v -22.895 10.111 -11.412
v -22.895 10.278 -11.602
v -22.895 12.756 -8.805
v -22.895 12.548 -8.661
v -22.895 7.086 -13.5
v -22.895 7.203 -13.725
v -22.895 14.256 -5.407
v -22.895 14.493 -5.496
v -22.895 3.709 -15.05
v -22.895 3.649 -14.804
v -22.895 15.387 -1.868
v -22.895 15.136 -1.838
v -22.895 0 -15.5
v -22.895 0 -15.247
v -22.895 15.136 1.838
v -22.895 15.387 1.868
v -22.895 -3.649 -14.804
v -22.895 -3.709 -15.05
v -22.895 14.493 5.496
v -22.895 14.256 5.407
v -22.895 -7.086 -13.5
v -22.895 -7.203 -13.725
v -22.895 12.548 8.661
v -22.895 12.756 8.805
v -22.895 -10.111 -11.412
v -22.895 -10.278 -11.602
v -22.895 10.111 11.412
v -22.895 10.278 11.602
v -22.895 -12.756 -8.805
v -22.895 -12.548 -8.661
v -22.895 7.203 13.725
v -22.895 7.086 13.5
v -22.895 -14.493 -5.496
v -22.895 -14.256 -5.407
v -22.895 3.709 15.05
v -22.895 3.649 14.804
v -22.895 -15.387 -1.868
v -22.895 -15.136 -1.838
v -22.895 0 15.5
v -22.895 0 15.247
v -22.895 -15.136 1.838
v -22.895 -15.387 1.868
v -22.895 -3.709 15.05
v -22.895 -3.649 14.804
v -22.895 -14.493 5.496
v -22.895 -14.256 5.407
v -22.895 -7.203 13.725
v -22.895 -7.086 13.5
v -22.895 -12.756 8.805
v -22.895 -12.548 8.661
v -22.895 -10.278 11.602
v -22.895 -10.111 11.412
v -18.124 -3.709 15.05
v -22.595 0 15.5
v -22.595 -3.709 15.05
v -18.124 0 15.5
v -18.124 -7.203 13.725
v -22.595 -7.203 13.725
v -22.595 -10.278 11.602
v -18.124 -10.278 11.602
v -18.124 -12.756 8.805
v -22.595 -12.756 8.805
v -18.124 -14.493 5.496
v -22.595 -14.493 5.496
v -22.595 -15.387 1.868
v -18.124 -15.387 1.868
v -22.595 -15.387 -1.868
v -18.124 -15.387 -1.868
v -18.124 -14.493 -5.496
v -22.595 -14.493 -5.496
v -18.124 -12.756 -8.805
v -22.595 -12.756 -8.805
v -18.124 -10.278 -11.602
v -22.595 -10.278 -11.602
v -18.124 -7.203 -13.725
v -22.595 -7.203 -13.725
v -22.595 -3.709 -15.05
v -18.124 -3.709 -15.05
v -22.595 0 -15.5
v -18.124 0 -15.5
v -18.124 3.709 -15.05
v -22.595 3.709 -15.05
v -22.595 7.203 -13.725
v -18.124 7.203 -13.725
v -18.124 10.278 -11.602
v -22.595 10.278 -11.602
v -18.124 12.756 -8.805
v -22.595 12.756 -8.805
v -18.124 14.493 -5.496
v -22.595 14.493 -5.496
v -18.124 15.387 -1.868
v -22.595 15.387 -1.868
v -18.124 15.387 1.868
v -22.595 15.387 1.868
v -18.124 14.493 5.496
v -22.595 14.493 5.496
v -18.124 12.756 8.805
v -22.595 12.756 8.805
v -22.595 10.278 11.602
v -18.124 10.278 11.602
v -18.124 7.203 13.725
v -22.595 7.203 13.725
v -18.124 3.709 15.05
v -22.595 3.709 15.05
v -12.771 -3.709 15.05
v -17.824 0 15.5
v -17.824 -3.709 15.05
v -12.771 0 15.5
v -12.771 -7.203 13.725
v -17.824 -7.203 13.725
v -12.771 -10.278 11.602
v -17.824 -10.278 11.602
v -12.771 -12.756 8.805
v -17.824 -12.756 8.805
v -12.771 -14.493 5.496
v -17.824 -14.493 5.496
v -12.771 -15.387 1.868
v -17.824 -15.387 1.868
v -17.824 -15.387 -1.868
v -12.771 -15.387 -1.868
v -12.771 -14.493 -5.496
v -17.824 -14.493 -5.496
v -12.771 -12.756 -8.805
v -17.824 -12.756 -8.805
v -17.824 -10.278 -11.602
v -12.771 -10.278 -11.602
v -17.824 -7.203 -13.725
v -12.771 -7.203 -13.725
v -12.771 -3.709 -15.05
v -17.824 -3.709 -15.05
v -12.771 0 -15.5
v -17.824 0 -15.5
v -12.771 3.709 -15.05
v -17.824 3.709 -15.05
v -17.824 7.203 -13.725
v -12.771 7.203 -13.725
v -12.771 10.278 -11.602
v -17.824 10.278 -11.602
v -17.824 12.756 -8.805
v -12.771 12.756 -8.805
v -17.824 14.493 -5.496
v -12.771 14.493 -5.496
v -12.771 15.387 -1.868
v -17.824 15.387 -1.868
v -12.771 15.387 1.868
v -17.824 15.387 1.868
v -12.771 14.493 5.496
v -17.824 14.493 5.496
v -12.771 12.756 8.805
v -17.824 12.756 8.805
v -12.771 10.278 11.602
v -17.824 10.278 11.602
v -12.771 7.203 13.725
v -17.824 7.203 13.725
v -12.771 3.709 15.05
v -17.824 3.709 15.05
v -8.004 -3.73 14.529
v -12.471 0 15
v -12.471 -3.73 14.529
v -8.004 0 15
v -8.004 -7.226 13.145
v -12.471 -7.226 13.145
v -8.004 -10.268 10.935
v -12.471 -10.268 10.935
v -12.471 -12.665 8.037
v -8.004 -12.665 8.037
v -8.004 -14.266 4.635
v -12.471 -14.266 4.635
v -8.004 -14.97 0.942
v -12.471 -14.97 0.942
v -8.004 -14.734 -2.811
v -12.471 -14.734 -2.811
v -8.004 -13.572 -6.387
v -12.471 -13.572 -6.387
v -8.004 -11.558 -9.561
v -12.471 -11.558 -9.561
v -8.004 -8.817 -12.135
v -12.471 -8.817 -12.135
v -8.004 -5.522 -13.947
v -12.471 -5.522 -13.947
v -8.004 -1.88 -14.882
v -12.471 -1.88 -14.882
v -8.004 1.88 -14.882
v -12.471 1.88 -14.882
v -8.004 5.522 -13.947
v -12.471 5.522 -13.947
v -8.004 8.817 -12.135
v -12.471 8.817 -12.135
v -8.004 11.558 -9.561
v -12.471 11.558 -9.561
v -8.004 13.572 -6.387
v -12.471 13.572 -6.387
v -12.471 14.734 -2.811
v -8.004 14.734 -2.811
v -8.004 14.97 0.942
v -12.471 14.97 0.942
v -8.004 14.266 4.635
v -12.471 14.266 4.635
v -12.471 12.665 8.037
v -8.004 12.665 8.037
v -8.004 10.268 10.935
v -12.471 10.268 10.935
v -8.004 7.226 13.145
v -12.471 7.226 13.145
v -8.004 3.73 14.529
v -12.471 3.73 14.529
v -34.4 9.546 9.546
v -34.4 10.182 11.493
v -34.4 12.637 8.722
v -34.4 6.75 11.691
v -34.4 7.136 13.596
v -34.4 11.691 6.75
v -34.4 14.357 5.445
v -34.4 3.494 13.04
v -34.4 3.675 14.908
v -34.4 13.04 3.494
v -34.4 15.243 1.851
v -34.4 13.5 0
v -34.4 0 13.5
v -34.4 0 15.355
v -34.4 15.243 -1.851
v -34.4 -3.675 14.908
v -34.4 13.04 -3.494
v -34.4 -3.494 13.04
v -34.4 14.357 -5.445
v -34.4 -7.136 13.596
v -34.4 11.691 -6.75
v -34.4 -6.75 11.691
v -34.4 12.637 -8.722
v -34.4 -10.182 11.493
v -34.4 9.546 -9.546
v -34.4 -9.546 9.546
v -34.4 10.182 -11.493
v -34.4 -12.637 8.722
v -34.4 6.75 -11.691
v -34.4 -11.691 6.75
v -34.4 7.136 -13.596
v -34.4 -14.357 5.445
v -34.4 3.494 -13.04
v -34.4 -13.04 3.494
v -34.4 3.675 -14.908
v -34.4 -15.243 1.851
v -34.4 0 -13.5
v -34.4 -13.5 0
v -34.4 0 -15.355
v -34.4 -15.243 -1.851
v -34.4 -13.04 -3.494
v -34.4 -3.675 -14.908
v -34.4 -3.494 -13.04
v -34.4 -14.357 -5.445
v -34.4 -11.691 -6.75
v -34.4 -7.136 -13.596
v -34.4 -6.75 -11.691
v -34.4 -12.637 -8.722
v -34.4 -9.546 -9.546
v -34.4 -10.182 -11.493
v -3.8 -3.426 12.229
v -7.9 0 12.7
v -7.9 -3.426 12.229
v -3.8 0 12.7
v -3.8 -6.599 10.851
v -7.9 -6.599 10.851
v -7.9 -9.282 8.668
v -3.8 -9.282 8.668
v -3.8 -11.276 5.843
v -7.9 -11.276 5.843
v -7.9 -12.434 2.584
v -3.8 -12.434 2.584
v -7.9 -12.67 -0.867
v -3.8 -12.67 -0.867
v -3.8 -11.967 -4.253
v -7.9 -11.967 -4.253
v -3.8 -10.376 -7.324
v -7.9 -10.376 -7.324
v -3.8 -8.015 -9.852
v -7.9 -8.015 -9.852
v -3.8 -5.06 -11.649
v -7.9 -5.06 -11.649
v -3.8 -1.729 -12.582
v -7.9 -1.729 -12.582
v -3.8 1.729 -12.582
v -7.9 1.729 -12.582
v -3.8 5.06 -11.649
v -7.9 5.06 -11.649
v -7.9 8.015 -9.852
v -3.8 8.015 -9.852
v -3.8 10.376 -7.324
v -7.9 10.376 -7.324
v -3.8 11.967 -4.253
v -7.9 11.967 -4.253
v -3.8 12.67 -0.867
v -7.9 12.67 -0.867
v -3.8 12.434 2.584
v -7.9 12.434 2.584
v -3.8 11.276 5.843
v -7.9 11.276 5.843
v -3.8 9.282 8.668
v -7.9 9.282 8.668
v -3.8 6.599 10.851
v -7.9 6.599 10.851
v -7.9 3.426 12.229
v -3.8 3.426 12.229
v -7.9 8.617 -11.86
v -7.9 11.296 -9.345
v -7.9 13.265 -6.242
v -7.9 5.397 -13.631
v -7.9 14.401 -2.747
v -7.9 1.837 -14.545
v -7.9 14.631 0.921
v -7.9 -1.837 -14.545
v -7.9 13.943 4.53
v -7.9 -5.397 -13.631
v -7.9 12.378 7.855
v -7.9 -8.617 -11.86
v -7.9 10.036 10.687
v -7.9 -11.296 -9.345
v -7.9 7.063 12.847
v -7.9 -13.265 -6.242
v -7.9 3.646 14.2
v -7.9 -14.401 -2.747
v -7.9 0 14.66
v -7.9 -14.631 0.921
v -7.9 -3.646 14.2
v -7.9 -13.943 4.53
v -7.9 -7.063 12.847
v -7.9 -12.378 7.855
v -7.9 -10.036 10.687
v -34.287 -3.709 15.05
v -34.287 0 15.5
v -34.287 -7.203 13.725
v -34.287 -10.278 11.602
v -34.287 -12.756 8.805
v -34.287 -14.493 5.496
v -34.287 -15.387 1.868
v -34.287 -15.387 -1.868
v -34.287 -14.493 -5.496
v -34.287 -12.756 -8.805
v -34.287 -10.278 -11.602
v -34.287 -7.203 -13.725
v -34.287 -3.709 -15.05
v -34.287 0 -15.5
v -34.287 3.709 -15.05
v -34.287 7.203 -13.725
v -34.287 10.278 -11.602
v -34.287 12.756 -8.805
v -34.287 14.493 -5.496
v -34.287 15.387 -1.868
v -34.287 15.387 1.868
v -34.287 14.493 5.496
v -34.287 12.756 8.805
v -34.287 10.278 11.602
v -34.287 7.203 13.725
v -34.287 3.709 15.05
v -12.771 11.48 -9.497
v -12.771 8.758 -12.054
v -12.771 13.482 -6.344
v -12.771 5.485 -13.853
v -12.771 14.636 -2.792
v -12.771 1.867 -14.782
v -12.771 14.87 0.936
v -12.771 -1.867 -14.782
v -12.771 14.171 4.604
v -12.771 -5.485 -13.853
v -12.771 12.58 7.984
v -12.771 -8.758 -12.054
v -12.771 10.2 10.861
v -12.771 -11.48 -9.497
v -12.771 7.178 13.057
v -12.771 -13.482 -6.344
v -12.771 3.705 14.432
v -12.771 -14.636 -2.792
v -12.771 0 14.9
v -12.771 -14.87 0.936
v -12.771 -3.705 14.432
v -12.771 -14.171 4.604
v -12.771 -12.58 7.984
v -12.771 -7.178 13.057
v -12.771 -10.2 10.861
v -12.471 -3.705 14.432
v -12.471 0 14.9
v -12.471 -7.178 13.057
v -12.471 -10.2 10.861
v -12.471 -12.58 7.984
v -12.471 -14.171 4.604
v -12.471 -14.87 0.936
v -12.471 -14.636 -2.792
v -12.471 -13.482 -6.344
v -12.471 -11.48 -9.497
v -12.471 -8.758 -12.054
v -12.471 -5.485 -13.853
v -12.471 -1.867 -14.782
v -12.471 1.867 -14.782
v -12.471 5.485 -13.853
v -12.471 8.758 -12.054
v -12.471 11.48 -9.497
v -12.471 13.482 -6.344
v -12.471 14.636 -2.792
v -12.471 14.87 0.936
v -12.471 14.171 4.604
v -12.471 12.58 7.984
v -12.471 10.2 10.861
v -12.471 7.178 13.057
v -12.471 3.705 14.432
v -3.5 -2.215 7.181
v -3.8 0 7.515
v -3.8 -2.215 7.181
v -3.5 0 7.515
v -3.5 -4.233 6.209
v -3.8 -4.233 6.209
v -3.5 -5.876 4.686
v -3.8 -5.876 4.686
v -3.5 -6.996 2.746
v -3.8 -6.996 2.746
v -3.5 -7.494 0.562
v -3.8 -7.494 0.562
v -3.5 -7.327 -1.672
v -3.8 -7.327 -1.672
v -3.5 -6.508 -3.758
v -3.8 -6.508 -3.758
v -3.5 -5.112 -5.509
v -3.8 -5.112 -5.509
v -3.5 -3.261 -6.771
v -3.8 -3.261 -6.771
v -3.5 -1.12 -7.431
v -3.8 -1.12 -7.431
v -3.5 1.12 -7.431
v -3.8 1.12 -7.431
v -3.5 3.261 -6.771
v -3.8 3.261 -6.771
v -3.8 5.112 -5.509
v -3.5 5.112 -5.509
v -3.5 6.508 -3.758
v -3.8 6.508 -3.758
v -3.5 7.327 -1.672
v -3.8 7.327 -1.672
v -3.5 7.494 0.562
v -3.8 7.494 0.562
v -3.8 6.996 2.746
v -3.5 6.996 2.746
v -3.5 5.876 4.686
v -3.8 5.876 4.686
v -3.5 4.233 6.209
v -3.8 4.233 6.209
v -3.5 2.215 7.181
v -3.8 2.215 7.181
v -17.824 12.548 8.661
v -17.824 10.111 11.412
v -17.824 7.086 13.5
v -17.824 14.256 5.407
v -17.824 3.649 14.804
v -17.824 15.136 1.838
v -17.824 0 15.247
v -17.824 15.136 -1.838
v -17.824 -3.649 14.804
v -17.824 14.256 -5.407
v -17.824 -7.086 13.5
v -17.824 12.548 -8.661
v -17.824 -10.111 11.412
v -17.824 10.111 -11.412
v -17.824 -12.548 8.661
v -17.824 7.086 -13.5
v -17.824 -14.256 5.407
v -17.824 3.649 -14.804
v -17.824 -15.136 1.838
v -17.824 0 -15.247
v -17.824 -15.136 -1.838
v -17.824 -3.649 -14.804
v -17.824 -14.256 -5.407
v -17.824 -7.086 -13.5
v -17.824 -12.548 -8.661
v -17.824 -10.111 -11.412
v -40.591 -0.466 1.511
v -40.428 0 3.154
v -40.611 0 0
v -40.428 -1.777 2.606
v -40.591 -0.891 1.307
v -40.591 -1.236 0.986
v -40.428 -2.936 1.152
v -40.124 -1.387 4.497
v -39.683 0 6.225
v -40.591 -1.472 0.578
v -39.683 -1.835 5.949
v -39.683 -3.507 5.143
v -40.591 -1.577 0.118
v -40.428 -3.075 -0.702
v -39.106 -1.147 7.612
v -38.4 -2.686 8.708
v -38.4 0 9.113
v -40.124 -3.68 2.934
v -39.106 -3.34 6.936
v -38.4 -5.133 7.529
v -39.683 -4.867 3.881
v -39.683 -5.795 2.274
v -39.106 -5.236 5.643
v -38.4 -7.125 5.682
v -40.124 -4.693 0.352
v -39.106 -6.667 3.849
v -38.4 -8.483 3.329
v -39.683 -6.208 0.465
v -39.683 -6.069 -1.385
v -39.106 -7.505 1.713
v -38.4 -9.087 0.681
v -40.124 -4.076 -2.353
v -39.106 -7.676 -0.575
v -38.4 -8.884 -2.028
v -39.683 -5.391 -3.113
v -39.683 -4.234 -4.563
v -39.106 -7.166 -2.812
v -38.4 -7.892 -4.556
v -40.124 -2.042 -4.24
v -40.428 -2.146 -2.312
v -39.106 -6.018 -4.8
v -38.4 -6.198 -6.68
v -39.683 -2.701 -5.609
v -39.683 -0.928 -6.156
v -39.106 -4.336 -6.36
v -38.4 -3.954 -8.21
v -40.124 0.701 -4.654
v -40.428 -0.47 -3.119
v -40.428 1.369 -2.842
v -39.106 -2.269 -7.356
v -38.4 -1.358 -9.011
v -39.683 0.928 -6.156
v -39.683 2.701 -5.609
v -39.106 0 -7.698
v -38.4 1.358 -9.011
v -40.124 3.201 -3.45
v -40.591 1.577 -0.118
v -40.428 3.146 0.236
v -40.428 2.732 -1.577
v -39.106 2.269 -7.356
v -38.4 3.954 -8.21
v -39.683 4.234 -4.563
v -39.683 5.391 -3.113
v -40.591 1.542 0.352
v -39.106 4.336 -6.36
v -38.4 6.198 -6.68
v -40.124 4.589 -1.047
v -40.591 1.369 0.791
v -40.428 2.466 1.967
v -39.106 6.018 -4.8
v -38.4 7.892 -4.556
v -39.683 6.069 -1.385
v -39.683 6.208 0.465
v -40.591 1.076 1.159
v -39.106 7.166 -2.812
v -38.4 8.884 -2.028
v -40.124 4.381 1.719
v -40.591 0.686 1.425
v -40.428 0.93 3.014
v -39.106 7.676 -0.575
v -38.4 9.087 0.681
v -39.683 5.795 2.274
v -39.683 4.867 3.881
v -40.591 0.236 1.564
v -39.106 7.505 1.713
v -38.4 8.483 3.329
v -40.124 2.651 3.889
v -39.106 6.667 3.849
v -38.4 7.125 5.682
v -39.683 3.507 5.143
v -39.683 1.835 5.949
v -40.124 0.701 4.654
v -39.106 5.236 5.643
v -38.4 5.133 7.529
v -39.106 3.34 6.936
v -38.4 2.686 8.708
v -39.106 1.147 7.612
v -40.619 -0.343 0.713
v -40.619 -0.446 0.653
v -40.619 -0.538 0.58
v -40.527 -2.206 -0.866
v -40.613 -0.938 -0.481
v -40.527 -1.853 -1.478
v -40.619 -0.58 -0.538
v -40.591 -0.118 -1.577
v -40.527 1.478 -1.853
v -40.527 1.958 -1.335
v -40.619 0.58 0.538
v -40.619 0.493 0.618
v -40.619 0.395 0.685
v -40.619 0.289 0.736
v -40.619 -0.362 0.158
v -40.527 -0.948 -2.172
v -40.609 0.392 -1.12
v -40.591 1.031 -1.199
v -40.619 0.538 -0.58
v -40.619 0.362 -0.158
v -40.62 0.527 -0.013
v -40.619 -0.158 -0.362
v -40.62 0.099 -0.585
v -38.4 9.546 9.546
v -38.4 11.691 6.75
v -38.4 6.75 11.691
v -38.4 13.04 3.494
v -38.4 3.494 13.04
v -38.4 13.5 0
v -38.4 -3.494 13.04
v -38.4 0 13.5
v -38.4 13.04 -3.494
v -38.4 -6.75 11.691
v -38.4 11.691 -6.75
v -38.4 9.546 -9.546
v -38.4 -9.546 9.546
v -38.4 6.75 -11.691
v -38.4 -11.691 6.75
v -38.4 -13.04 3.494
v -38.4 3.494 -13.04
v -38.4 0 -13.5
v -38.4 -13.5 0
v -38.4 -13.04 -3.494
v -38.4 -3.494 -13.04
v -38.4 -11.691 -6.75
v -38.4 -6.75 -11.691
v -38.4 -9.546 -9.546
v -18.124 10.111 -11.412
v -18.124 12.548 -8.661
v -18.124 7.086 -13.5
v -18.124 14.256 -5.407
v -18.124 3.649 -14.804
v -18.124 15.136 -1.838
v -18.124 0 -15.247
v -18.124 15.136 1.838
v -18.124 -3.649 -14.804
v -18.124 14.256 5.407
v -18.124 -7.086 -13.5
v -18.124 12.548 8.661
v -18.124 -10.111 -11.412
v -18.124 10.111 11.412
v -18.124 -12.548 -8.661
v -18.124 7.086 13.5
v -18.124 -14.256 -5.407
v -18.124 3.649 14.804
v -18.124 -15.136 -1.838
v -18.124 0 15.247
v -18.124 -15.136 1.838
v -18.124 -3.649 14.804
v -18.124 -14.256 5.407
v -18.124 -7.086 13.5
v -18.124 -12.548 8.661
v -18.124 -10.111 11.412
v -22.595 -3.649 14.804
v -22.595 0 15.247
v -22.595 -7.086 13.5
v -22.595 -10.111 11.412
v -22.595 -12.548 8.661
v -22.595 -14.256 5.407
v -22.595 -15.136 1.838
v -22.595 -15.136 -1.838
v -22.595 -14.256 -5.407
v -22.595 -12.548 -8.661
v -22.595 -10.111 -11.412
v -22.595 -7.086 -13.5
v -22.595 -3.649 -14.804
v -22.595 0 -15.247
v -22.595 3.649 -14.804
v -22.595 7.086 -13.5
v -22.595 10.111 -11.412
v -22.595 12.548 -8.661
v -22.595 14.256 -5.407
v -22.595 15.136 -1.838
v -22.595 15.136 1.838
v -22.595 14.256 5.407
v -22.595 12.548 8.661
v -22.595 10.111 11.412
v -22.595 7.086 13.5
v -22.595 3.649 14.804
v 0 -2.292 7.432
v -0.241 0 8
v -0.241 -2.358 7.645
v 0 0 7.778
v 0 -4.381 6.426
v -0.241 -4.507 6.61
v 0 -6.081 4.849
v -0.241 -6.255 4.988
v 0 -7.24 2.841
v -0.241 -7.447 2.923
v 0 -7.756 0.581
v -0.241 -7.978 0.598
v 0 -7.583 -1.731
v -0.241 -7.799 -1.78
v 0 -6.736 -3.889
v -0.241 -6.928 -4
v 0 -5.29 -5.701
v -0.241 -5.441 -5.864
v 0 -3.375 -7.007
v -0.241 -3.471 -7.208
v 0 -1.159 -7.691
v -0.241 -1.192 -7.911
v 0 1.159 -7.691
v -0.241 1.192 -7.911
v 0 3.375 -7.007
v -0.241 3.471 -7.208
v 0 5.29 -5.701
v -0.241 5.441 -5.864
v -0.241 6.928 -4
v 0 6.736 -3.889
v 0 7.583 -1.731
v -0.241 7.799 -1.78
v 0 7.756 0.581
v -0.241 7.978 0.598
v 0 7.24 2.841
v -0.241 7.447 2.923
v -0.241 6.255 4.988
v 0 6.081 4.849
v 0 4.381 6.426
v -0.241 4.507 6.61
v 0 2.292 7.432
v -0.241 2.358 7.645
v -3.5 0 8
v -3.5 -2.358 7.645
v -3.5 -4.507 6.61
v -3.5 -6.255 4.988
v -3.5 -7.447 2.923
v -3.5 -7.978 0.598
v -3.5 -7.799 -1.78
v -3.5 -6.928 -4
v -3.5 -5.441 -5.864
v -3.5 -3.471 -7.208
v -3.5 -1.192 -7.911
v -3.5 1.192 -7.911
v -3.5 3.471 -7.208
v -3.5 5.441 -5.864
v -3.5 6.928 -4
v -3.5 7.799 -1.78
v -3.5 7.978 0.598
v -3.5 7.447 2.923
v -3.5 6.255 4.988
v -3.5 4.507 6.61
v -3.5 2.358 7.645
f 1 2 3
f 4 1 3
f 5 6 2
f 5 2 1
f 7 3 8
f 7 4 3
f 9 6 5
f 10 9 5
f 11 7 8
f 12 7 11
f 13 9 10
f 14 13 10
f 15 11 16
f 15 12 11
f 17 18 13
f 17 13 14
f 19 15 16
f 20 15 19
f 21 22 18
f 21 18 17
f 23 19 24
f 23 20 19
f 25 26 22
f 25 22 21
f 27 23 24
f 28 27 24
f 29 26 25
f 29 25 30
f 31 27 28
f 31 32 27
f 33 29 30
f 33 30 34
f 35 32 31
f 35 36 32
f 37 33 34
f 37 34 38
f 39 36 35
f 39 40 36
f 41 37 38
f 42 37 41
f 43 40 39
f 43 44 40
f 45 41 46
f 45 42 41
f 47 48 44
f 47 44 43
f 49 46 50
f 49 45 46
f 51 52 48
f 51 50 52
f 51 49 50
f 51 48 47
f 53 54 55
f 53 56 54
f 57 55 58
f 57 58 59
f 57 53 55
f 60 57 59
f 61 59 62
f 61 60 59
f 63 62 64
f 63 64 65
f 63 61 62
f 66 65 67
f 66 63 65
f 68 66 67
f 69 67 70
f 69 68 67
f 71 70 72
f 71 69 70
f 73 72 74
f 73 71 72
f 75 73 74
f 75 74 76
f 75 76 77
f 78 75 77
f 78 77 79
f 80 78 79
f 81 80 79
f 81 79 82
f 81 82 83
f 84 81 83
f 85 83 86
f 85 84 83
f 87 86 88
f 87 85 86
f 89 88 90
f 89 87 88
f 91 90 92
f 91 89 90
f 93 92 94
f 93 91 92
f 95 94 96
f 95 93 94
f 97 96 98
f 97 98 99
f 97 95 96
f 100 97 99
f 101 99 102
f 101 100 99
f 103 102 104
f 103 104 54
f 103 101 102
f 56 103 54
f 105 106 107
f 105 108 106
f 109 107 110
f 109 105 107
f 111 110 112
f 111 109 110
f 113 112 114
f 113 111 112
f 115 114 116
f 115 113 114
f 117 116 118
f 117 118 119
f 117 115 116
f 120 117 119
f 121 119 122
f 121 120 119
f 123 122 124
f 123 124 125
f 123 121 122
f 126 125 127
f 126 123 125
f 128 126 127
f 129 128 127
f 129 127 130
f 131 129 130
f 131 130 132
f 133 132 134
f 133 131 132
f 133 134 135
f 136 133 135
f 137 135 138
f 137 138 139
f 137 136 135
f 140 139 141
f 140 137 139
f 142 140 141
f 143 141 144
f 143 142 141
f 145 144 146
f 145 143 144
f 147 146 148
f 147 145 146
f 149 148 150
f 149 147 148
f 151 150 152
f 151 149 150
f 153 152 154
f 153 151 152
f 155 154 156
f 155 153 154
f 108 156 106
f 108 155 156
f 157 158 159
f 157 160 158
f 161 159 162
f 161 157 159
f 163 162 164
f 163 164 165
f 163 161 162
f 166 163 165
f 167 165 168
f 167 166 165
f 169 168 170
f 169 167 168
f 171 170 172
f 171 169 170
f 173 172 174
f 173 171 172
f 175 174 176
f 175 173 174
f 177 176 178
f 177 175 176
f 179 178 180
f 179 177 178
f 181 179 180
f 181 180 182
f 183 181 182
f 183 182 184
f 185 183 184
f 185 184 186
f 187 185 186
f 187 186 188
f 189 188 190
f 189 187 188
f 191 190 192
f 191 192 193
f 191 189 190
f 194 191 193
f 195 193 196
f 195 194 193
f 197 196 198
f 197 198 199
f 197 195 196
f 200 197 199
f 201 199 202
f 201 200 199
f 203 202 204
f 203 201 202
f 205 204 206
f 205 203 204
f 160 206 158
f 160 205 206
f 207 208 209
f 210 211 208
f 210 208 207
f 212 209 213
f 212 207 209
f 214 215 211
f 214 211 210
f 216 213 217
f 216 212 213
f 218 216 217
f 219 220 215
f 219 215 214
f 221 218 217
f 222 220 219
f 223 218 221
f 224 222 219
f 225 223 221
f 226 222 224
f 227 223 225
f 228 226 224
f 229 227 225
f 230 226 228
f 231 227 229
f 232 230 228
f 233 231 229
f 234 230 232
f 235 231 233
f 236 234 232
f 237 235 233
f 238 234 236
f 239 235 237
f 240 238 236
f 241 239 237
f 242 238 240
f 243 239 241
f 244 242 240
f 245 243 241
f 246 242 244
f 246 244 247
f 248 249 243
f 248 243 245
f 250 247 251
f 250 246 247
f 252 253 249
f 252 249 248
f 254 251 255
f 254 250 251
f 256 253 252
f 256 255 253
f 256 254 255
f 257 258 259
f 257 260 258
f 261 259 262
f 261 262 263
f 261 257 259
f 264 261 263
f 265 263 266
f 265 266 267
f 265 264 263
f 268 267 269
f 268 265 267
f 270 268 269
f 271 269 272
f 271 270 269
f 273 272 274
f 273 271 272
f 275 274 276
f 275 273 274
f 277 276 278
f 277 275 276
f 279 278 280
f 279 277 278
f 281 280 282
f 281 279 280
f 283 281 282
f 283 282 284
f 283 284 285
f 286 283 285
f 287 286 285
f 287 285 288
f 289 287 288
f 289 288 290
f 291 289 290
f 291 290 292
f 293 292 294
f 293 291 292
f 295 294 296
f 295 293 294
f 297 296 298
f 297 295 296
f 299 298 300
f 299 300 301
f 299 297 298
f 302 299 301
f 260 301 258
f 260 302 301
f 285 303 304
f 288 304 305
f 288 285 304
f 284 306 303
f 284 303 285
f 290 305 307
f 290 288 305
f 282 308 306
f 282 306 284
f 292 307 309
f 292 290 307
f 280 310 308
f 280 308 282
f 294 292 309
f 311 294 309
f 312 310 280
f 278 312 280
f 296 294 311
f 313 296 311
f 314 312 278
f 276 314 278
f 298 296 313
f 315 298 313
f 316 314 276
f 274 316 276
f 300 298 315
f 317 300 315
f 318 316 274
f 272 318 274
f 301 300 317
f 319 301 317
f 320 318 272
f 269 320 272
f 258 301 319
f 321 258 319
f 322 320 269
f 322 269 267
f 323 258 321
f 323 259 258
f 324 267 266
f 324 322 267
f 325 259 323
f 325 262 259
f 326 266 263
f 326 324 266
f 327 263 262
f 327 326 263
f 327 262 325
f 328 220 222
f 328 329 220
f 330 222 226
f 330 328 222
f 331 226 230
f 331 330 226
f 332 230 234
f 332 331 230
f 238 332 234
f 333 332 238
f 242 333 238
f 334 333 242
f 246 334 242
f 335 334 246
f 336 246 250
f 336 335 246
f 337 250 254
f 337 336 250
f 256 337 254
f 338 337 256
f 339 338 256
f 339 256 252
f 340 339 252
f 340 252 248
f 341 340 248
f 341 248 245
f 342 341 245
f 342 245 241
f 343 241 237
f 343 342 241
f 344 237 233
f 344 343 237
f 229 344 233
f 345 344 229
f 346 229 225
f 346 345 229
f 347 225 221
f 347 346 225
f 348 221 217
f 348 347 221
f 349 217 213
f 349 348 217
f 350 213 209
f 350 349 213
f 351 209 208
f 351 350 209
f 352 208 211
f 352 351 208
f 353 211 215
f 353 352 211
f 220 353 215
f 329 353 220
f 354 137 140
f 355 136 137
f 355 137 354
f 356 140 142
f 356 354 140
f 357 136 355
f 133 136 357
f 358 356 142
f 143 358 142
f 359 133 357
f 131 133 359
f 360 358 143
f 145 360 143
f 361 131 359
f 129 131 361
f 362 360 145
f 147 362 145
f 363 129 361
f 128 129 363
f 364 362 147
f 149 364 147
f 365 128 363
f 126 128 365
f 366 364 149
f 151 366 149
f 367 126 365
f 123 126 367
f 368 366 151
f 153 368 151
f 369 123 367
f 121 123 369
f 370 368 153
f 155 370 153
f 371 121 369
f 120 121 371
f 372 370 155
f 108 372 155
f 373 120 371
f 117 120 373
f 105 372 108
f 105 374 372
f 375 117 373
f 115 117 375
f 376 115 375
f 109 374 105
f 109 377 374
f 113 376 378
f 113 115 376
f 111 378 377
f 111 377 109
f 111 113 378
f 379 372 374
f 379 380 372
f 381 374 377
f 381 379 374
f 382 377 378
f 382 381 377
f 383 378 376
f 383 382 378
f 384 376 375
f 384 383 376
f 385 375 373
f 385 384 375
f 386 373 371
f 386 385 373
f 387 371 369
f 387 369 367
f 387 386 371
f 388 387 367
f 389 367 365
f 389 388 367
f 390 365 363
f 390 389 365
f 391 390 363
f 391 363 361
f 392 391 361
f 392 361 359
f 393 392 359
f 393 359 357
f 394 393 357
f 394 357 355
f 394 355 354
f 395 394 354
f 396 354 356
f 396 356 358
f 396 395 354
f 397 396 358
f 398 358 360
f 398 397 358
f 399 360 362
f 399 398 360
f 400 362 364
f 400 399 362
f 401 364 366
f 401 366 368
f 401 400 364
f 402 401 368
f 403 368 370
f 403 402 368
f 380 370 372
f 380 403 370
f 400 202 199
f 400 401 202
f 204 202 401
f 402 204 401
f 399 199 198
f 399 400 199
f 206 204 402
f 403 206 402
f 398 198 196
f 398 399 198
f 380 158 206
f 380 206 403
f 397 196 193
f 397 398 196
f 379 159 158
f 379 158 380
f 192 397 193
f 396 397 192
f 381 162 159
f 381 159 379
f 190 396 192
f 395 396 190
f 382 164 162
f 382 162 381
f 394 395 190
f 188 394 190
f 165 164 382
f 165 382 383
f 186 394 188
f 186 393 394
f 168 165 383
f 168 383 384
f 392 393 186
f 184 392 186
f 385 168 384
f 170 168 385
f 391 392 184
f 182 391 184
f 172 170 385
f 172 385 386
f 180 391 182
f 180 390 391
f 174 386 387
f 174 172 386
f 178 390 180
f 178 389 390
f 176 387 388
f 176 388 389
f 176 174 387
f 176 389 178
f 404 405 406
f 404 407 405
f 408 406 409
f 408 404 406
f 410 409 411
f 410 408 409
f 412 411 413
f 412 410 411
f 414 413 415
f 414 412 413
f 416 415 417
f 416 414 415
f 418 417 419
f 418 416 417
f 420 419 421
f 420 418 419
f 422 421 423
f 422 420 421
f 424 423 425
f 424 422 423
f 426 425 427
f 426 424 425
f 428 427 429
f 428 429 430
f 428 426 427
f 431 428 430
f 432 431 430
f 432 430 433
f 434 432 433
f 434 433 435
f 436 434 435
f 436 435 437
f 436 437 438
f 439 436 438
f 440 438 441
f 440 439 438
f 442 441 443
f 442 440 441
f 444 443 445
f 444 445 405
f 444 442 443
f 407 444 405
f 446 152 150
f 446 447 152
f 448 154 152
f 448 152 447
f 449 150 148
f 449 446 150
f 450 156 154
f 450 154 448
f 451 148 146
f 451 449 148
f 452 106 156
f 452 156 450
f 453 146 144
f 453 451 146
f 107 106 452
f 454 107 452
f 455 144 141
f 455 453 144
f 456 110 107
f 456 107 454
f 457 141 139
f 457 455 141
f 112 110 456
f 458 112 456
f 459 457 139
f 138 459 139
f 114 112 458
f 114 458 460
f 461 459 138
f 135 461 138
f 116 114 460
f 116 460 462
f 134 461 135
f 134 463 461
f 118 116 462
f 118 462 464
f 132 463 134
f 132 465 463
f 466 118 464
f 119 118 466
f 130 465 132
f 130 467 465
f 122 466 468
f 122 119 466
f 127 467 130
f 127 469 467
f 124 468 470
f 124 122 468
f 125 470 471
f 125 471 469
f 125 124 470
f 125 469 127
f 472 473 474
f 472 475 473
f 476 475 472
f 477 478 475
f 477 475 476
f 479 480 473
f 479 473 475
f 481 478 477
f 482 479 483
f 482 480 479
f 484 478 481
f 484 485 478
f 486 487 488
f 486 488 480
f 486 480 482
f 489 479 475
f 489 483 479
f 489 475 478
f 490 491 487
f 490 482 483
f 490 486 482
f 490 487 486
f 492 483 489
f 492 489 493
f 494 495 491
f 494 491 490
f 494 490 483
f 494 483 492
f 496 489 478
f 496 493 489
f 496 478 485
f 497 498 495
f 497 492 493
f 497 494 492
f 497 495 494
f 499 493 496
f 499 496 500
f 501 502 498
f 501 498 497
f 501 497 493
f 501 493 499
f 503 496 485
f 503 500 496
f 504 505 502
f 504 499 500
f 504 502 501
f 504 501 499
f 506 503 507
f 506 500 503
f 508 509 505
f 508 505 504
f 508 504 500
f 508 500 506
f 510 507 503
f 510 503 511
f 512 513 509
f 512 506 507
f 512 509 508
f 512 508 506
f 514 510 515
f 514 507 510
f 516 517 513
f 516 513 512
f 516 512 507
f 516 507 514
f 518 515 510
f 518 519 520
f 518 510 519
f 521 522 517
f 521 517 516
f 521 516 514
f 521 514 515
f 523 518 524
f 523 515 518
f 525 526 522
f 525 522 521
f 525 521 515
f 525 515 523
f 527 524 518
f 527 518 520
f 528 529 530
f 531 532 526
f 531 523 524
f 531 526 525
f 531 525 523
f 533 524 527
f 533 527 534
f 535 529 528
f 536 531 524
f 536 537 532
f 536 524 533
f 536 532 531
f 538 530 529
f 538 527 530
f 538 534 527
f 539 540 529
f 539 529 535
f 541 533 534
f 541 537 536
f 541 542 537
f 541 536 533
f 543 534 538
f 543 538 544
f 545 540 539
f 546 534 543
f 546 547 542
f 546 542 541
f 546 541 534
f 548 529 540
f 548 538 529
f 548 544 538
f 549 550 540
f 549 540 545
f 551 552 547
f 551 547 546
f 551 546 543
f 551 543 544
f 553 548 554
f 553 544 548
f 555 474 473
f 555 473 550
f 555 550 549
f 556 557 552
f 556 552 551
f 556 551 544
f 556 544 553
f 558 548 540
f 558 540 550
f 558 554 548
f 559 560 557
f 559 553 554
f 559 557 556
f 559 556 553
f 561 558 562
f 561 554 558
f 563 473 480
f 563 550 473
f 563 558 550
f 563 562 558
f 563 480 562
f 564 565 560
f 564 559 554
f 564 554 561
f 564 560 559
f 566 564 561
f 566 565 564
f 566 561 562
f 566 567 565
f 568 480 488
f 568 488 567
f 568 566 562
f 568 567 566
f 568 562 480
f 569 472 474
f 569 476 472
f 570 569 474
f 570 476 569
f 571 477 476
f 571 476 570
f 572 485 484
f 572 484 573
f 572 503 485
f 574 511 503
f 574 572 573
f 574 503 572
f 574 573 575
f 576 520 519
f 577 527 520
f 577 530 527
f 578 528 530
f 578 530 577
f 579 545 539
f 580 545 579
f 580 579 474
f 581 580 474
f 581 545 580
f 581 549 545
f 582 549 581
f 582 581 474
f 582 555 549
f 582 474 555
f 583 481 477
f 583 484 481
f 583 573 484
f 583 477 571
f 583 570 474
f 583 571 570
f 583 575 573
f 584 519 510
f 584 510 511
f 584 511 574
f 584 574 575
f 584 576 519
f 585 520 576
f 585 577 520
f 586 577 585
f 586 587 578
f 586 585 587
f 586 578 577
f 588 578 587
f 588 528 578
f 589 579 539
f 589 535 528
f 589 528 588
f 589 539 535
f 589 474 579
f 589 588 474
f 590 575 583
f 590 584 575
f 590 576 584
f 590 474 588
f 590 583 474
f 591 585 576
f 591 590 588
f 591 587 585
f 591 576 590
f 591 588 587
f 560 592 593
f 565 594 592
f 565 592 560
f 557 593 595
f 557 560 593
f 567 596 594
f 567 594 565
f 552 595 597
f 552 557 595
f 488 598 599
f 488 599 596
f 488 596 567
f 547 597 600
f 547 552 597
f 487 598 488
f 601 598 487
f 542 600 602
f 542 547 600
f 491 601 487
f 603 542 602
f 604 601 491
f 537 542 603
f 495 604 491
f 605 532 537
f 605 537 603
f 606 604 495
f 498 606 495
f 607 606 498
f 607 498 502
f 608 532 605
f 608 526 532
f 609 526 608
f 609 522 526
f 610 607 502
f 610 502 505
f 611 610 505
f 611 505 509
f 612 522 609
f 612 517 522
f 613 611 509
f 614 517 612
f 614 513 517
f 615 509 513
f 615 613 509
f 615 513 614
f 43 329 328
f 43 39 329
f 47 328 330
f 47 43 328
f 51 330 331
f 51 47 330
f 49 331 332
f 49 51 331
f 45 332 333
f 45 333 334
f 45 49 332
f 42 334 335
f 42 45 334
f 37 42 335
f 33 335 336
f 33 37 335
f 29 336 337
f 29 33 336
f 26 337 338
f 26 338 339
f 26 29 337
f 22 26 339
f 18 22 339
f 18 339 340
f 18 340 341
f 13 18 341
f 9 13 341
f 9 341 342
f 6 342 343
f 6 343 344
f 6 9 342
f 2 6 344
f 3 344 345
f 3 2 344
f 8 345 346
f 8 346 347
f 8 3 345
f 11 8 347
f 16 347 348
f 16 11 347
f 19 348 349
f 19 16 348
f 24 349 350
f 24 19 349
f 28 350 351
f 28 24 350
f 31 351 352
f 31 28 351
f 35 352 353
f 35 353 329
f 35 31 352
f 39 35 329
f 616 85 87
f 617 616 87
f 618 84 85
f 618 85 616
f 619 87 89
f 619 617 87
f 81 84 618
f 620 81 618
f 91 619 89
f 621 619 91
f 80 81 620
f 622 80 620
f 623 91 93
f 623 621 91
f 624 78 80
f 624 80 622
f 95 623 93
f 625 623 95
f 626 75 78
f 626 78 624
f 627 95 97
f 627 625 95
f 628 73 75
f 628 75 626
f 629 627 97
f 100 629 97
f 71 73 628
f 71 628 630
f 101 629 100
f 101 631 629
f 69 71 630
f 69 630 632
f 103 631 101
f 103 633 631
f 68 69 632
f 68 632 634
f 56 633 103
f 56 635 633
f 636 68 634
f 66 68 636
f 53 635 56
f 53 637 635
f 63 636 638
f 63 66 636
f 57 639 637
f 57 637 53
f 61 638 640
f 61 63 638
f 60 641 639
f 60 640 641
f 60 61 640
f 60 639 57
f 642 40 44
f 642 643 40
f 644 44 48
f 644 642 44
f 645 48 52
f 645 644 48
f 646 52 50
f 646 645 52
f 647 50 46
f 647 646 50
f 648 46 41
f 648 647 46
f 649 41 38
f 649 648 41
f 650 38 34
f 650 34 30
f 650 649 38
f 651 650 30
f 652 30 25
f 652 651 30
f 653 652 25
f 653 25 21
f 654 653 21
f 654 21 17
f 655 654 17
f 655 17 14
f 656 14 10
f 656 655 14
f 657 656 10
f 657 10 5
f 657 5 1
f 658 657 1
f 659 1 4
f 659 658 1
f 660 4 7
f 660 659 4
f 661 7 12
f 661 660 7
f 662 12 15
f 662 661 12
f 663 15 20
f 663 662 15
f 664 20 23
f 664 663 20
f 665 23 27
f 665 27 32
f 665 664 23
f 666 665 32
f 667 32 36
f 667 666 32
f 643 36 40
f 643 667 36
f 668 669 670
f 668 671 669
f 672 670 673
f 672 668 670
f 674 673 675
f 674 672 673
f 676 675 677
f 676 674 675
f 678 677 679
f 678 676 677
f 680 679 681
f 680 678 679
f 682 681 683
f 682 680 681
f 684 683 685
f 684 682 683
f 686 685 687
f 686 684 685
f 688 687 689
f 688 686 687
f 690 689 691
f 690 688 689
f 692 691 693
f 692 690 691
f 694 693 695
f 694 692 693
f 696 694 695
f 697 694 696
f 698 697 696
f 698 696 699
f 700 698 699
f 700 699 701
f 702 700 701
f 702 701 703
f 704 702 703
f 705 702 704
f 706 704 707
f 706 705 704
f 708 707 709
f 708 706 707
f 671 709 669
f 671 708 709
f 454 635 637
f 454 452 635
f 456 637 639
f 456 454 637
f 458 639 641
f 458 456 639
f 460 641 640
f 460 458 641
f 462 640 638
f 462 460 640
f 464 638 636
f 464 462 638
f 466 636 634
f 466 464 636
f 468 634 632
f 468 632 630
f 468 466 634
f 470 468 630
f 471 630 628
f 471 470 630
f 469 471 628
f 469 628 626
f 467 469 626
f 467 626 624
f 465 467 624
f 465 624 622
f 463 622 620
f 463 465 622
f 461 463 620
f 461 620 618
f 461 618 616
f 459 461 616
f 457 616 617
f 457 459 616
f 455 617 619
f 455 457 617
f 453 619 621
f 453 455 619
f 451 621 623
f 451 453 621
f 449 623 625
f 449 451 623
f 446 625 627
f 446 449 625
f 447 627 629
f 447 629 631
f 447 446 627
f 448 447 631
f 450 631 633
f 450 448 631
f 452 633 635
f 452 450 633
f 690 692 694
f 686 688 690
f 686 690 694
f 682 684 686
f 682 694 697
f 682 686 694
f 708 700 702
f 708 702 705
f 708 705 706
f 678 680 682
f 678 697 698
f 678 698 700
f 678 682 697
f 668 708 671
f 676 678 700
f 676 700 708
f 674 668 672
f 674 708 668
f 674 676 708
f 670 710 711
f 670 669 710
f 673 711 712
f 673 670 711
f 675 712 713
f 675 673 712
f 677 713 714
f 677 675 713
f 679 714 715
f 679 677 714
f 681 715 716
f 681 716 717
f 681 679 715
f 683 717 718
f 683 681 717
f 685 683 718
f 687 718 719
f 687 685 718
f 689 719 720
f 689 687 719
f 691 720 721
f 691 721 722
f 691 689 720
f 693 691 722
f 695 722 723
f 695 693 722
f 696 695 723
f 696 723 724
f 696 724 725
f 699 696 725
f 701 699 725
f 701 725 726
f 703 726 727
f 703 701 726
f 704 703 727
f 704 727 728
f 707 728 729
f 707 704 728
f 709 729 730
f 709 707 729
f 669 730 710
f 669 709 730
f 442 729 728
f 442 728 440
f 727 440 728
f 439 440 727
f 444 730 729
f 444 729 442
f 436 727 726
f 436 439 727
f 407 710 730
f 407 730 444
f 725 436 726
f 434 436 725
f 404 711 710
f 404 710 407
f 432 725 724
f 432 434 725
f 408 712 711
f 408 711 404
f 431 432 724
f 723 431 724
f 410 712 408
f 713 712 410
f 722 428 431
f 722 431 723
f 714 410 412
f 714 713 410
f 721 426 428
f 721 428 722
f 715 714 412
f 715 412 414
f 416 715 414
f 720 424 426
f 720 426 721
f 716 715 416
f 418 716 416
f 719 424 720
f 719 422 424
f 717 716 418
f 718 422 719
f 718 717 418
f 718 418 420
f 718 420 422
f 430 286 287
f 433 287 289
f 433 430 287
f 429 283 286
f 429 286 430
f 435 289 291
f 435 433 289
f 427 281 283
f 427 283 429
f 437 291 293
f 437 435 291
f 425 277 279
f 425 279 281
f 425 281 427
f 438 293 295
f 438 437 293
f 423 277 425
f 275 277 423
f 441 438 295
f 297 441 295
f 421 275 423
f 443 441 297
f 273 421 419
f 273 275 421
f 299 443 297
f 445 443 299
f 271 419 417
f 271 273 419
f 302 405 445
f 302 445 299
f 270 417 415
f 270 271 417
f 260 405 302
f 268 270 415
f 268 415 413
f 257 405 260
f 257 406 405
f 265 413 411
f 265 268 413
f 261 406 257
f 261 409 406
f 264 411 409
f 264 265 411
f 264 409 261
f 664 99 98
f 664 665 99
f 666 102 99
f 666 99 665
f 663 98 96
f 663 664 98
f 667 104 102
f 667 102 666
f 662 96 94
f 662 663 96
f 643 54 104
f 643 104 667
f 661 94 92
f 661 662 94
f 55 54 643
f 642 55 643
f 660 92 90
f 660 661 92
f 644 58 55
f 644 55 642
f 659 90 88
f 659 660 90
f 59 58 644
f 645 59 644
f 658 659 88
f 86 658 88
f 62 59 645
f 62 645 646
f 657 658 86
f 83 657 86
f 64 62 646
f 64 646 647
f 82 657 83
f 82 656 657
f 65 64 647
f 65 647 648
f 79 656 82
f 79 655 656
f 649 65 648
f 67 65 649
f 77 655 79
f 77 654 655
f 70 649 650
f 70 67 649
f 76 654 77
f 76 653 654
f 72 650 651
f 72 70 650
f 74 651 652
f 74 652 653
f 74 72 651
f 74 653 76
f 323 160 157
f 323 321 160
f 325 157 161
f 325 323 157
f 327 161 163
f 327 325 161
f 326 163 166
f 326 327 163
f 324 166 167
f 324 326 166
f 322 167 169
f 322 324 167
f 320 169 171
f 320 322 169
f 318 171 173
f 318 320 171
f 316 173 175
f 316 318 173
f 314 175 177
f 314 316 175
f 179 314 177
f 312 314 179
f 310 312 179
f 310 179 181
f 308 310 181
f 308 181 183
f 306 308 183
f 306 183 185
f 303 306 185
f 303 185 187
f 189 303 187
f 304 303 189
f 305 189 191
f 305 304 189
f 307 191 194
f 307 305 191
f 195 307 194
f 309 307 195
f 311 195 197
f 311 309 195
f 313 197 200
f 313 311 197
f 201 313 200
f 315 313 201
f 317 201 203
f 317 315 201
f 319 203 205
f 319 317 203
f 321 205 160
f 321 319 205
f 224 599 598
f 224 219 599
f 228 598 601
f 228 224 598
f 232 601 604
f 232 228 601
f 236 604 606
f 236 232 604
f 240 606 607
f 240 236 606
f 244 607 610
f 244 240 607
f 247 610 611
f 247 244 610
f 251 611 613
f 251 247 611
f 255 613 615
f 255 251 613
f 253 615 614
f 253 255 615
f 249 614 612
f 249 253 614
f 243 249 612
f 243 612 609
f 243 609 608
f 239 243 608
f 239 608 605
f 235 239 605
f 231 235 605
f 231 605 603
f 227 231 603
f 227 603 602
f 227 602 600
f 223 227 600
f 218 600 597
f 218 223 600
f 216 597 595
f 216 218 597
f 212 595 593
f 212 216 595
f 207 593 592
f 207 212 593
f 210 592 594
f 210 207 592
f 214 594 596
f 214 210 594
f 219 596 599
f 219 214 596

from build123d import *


with BuildPart() as part:
    # Sketch1 → Revolve1 (revolve)
    with BuildSketch(Plane.XY, mode=Mode.PRIVATE) as revolve1_sk:
        Polygon((-38.4, 0), (-38.4, 13.5), (-34.4, 13.5), (-34.4, 15.354591962), (-34.287468985, 15.5), (-22.895018976, 15.5), (-22.895018976, 15.246920735), (-22.595018976, 15.246920735), (-22.595018976, 15.5), (-18.123640766, 15.5), (-18.123640766, 15.246920735), (-17.823640766, 15.246920735), (-17.823640766, 15.5), (-12.771458761, 15.5), (-12.771458761, 14.899770288), (-12.471458761, 14.899770288), (-12.471458761, 15), (-8.004107003, 15), (-7.9, 14.660301421), (-7.9, 12.7), (-3.799837925, 12.7), (-3.799837925, 7.515096405), (-3.499837925, 7.515096405), (-3.499837925, 8), (-0.240891884, 8), (0, 7.777504369), (0, 0), align=None)
    revolve(revolve1_sk.sketch.rotate(Axis((-61.595871807, 0, 0), (1, 0, 0)), 90), axis=Axis((-61.595871807, 0, 0), (1, 0, 0)))

    # Sketch2 → Revolve2 (revolve)
    with BuildSketch(Plane(origin=(0, 0, 0), x_dir=(1, 0, 0), z_dir=(0, 1, 0))):
        with BuildLine():
            Line((-38.4, -9.112860892), (-38.4, 0))
            Line((-38.4, 0), (-40.611277306, 0))
            ThreePointArc((-40.611277306, 0), (-40.124324385, -4.706557364), (-38.4, -9.112860892))
        make_face()
    revolve(axis=Axis((-49.369562138, 0, 0), (1, 0, 0)))


solid = part.part
